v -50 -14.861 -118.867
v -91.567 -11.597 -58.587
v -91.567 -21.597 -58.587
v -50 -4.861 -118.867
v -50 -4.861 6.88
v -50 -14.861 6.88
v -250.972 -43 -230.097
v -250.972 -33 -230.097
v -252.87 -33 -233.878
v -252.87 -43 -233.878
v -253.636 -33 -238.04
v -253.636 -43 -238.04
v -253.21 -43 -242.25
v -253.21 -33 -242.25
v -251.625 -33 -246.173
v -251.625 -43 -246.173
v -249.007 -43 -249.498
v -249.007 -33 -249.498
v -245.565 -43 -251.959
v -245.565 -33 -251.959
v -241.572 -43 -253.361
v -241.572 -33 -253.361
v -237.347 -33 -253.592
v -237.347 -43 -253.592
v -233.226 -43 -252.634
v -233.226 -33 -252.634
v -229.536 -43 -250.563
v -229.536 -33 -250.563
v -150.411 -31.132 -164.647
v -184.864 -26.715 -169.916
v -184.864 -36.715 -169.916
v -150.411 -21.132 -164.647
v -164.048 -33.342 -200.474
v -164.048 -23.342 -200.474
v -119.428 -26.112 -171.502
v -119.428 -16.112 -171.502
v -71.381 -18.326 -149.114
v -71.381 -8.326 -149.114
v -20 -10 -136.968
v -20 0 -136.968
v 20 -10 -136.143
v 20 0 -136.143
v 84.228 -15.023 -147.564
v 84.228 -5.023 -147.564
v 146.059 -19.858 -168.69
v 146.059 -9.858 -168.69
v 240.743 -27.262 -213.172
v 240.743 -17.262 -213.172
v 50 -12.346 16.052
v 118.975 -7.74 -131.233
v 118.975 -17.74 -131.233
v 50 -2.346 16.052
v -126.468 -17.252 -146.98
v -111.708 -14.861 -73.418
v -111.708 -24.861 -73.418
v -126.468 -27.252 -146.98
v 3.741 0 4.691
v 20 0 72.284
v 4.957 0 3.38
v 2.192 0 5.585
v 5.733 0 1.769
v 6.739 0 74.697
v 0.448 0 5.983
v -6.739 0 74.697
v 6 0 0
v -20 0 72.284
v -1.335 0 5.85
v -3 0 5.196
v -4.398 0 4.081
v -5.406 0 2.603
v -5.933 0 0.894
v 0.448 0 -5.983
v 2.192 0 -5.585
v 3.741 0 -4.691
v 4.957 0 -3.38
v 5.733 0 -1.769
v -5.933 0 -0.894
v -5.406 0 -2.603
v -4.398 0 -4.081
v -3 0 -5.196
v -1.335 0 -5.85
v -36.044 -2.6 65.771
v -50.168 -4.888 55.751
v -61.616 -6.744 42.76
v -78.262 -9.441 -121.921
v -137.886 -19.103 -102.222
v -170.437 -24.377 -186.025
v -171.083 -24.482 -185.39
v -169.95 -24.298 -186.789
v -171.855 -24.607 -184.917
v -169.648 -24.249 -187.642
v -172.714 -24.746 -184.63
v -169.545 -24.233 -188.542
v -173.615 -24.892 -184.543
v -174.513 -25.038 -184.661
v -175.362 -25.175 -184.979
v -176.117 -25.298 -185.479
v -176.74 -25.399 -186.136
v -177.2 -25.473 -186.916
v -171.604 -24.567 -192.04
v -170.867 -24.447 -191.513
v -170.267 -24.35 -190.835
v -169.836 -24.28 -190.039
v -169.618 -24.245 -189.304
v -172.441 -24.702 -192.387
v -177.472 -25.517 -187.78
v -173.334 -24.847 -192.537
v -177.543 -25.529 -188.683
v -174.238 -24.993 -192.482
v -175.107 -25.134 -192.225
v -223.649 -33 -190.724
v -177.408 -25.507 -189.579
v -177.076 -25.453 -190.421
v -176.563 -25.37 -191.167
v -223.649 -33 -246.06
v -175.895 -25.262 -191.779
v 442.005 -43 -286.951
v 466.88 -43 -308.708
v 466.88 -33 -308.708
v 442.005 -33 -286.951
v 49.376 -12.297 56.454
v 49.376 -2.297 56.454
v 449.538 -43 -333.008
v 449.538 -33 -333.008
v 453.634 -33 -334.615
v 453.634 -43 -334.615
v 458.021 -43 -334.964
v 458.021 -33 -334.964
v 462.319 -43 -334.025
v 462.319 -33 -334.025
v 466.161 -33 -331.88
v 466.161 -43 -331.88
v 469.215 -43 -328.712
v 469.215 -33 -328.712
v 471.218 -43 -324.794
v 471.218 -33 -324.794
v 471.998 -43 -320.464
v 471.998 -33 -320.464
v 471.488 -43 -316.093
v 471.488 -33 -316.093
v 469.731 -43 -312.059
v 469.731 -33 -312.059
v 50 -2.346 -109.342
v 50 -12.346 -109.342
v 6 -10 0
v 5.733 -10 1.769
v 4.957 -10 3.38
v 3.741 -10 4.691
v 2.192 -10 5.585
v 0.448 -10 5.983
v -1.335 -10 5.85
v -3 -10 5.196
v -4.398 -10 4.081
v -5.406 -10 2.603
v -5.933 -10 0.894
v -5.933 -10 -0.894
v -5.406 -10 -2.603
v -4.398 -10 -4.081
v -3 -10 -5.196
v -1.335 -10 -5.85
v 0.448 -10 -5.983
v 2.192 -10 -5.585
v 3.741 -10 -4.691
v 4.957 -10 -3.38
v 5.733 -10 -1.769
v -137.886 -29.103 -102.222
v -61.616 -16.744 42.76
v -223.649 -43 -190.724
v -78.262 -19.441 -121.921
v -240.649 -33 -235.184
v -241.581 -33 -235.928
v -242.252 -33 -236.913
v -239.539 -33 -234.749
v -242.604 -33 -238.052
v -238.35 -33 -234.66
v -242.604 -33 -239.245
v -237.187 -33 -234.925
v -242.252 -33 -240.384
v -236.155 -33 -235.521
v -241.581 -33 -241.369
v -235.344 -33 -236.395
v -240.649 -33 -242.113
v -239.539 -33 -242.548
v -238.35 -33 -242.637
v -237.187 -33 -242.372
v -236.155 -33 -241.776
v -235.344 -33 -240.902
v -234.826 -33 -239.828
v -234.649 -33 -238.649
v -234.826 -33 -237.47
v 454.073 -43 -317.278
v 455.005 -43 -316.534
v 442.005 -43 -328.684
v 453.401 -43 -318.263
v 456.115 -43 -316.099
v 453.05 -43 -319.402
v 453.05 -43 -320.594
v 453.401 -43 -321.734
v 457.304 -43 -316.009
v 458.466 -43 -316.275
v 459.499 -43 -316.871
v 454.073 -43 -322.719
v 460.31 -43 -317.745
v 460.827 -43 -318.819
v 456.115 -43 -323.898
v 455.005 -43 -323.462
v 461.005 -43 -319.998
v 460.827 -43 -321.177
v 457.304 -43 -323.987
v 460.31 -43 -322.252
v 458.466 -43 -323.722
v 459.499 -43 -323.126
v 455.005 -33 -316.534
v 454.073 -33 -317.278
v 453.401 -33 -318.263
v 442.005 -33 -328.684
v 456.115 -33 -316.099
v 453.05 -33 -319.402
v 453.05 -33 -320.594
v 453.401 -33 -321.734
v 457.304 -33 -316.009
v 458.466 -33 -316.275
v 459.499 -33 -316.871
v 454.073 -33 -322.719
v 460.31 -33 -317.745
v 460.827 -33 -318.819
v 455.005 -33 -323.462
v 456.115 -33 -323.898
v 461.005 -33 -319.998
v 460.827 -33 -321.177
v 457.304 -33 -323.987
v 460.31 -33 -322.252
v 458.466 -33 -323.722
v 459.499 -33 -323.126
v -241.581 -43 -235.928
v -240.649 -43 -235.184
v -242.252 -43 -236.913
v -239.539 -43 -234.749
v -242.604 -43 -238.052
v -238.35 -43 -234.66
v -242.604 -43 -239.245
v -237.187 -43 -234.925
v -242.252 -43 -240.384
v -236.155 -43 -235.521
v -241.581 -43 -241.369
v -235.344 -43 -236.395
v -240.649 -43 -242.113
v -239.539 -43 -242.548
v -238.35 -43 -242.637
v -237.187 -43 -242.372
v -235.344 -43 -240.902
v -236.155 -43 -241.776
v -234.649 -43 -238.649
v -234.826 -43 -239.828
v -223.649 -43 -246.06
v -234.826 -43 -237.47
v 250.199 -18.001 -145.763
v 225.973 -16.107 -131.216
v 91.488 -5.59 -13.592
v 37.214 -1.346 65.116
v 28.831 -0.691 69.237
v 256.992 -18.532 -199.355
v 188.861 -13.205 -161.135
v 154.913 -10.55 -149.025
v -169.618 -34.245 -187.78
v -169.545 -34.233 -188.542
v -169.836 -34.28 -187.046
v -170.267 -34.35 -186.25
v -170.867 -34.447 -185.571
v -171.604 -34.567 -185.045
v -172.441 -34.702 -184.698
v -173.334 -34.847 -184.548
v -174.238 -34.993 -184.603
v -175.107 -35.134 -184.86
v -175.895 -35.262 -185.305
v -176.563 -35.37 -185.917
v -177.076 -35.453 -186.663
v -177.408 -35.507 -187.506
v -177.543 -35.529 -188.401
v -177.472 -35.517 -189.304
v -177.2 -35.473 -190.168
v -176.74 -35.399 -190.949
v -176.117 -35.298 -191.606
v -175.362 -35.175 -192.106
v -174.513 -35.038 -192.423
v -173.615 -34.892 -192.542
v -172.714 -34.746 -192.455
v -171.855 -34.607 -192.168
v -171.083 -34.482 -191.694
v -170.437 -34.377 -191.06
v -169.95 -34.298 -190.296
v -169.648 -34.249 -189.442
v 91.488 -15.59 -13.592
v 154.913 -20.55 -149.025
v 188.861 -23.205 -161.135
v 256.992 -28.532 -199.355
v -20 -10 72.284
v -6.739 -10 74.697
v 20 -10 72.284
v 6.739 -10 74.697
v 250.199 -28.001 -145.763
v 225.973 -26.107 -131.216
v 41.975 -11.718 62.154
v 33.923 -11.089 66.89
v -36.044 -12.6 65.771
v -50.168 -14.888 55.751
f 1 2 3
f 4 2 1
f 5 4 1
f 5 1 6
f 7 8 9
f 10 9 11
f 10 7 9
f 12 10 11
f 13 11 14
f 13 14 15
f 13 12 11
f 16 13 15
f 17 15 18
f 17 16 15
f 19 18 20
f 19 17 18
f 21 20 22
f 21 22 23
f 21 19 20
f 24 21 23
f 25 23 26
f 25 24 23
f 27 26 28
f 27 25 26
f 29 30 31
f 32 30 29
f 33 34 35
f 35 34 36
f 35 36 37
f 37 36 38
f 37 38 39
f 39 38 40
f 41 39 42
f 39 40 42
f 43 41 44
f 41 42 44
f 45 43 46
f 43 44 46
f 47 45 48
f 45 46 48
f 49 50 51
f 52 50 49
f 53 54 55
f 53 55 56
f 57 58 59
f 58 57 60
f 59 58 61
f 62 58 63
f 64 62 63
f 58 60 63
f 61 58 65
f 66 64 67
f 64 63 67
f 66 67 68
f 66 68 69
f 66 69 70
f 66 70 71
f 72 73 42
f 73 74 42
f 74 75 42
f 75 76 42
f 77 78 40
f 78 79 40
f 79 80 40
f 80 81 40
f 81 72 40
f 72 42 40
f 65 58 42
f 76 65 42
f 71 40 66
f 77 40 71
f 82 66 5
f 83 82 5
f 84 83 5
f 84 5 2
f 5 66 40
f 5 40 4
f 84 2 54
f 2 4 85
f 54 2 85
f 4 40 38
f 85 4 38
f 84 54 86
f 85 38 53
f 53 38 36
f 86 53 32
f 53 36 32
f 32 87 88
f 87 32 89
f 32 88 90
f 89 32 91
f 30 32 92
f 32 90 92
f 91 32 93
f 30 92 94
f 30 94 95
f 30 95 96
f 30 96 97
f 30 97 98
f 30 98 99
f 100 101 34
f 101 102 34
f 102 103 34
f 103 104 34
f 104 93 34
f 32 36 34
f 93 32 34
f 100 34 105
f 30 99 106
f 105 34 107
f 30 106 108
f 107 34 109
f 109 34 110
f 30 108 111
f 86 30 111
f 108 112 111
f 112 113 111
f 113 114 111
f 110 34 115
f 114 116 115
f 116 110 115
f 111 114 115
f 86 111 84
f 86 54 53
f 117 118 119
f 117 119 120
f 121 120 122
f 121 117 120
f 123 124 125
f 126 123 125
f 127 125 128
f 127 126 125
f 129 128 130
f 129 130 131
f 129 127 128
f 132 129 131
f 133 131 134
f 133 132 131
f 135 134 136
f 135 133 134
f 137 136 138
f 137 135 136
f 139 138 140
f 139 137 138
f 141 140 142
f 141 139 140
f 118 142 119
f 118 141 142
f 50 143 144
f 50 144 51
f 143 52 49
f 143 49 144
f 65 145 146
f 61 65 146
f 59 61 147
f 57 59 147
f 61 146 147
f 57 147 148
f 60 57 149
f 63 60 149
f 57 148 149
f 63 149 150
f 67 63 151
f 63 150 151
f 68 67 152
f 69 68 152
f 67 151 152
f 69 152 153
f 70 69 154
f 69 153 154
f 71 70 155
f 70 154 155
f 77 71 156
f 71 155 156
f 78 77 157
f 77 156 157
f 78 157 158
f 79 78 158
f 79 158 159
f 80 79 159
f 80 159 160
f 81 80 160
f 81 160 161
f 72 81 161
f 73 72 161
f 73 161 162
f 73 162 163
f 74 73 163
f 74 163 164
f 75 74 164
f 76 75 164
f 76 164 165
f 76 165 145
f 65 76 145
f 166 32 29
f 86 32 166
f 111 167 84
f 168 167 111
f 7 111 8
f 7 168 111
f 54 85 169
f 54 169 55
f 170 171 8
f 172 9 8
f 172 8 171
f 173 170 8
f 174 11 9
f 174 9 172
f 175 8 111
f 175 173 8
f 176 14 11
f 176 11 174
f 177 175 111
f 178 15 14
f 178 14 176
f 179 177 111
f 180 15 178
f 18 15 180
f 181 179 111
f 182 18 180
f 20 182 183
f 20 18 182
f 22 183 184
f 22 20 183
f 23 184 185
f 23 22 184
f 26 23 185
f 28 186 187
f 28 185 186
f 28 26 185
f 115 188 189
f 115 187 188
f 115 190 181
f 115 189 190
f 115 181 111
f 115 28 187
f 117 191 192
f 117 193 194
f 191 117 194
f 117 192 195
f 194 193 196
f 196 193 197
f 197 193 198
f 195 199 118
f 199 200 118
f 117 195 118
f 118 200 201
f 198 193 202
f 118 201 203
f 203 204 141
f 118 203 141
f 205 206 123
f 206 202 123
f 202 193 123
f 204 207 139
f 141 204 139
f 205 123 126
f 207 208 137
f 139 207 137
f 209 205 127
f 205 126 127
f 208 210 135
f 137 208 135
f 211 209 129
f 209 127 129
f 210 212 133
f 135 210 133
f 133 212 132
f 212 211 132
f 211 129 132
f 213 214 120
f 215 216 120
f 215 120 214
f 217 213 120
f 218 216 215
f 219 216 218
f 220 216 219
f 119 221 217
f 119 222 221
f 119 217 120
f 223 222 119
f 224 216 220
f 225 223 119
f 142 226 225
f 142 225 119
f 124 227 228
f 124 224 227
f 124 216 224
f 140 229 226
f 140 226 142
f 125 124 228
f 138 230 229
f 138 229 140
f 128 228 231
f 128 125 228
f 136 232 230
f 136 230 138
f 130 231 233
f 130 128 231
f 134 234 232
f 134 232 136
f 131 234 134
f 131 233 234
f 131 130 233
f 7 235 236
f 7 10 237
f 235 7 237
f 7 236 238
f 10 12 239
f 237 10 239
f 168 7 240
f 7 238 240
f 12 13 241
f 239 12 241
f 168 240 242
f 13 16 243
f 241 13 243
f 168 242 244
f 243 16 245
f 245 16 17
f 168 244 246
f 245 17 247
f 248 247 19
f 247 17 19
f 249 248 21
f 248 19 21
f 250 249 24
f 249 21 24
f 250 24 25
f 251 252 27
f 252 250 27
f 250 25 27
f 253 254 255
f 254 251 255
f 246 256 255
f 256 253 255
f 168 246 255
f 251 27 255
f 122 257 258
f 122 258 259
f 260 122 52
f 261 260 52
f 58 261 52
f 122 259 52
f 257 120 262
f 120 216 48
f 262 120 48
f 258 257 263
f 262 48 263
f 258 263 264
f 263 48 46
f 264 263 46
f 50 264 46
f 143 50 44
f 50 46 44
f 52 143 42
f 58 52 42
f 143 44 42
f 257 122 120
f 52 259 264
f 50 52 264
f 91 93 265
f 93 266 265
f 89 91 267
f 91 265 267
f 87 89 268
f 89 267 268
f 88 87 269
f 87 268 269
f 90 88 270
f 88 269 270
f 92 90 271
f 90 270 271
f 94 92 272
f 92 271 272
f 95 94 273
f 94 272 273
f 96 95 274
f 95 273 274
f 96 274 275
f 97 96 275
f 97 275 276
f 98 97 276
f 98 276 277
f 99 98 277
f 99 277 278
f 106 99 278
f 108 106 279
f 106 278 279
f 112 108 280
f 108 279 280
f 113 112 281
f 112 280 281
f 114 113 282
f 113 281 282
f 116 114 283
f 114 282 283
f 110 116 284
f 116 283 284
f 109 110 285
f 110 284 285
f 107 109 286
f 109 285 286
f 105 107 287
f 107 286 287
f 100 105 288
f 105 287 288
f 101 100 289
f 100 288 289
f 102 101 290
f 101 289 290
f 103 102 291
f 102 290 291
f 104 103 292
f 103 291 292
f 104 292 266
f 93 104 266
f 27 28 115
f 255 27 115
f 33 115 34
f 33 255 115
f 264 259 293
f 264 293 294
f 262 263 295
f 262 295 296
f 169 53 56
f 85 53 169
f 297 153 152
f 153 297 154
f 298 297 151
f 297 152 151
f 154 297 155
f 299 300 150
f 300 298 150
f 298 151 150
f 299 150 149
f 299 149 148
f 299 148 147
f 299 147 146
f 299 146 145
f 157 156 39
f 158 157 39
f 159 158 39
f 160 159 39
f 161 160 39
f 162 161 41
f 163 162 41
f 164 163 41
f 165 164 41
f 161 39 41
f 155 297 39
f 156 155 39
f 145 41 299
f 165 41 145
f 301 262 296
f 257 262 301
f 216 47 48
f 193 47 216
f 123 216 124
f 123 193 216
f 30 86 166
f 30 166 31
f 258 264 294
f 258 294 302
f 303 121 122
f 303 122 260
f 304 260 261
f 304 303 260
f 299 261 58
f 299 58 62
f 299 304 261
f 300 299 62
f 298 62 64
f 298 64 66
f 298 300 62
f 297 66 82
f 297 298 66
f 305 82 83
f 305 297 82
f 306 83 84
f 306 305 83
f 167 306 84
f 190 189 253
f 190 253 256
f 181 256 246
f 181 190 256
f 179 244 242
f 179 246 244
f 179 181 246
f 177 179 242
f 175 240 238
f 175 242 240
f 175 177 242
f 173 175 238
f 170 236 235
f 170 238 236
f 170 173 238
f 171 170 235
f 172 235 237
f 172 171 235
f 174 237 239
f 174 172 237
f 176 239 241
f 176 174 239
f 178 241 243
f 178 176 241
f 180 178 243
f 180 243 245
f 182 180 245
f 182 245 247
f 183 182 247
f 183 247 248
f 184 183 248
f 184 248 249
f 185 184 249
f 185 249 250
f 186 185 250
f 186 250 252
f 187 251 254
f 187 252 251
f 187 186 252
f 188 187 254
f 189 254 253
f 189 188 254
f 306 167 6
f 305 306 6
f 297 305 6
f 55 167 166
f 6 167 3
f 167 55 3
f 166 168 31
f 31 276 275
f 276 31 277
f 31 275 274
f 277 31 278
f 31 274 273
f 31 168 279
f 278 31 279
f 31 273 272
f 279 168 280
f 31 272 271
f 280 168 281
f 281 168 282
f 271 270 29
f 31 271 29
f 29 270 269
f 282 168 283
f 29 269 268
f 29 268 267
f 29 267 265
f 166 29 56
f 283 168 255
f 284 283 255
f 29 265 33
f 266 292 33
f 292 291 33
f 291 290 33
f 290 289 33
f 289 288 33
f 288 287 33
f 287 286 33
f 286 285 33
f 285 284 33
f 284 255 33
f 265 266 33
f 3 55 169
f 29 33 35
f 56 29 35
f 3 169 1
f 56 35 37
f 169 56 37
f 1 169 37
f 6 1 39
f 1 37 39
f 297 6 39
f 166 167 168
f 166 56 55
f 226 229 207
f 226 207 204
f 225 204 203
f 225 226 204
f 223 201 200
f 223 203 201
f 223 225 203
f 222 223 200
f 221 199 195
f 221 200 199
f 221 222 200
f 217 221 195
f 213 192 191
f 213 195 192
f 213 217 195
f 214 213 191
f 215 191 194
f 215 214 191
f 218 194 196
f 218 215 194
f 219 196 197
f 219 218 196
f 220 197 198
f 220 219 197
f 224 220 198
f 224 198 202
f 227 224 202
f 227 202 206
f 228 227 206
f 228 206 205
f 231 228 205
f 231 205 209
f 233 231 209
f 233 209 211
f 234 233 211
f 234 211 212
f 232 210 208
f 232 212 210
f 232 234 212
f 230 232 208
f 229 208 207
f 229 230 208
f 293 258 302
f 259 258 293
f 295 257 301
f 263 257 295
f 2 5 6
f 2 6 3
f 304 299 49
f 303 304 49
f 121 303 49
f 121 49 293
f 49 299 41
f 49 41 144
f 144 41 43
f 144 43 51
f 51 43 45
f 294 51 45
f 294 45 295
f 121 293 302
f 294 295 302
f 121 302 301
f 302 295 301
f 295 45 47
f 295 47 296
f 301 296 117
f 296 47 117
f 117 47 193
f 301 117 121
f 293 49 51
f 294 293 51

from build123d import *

# Parameters (mm, degrees)
F1_W     = 30
F1_H     = 10
F2_DEPTH = 340
F3_DEPTH = 100
F5_DEPTH = 76
F6_R     = 4
F6_R_2   = 6
F7_DEPTH = 66


with BuildPart() as f2:
    # F1 (on Top) → F2 (new body)
    with BuildSketch(Plane.XY):
        Polygon((0, 0), (-20, 0), (-20, -10), (0, -10), (20, -10), (20, 0), align=None)
        Polygon((-20, -10), (-20, 0), (-223.64854, -33), (-223.64854, -43), align=None)
        with Locations((-238.64854, -38)):
            Rectangle(F1_W, F1_H)
        Polygon((442.00493, -33), (20, 0), (20, -10), (442.00493, -43), align=None)
        with Locations((457.00493, -38)):
            Rectangle(F1_W, F1_H)
    extrude(amount=-F2_DEPTH)

    # F1 (on Top) → F3 (join)
    with BuildSketch(Plane.XY):
        Polygon((0, 0), (-20, 0), (-20, -10), (0, -10), (20, -10), (20, 0), align=None)
        Polygon((-20, -10), (-20, 0), (-223.64854, -33), (-223.64854, -43), align=None)
        with Locations((-238.64854, -38)):
            Rectangle(F1_W, F1_H)
        Polygon((442.00493, -33), (20, 0), (20, -10), (442.00493, -43), align=None)
        with Locations((457.00493, -38)):
            Rectangle(F1_W, F1_H)
    extrude(amount=F3_DEPTH)

    # F4 (on Front) → F5 (intersect, symmetric)
    with BuildSketch(Plane.XZ):
        with BuildLine():
            ThreePointArc((-250.9718022583, -230.0965111685), (-249.006915225, -249.4976876834), (-229.5356153331, -250.563010045))
            ThreePointArc((-229.5356153331, -250.563010045), (-225.2006047987, -245.2933166844), (-223.6485386505, -238.6485386505))
            ThreePointArc((-223.6485386505, -238.6485386505), (-234.1679669301, -224.3333552056), (-250.9718022583, -230.0965111685))
        make_face()
        with BuildLine():
            add(Edge.make_bspline(
                [(-229.5356153331, -250.563010045), (-208.7207010553, -234.6424785008), (-187.0701685552, -217.0301430269), (-164.0481391717, -200.4741451059)],
                knots=[0, 0, 0, 0, 0.1373195068, 0.1373195068, 0.1373195068, 0.1373195068], degree=3))
            Line((-229.5356153331, -250.563010045), (-164.0481391717, -200.4741451059))
        make_face()
        with BuildLine():
            ThreePointArc((-223.6485386505, -238.6485386505), (-225.2006047987, -245.2933166844), (-229.5356153331, -250.563010045))
            add(Edge.make_bspline(
                [(-229.5356153331, -250.563010045), (-208.7207010553, -234.6424785008), (-187.0701685552, -217.0301430269), (-164.0481391717, -200.4741451059)],
                knots=[0, 0, 0, 0, 0.1373195068, 0.1373195068, 0.1373195068, 0.1373195068], degree=3))
            Line((-164.0481391717, -200.4741451059), (0, -75))
            ThreePointArc((0, -75), (-66.4530293795, -34.7706037666), (-61.6163187638, 42.7601363655))
            Line((-61.6163187638, 42.7601363655), (-250.9718022583, -230.0965111685))
            ThreePointArc((-250.9718022583, -230.0965111685), (-234.1679669301, -224.3333552056), (-223.6485386505, -238.6485386505))
        make_face()
        with BuildLine():
            Line((0, -75), (-164.0481391717, -200.4741451059))
            add(Edge.make_bspline(
                [(-164.0481391717, -200.4741451059), (-116.7152354778, -166.4352929221), (-4.1014041633, -103.751655246), (155.4809175381, -168.4276528716), (240.7432263876, -213.1721002441)],
                knots=[0.1373195068, 0.1373195068, 0.1373195068, 0.1373195068, 0.4196460942, 0.7357326781, 0.7357326781, 0.7357326781, 0.7357326781], degree=3))
            Line((240.7432263876, -213.1721002441), (0, -75))
        make_face()
        with BuildLine():
            ThreePointArc((49.3759786376, 56.4536334843), (-9.1833788682, 74.4356470555), (-61.6163187638, 42.7601363655))
            ThreePointArc((-61.6163187638, 42.7601363655), (-66.4530293795, -34.7706037666), (0, -75))
            ThreePointArc((0, -75), (53.033008589, -53.033008589), (75, 0))
            ThreePointArc((75, 0), (68.2942105812, 30.9983999763), (49.3759786376, 56.4536334843))
        make_face()
        with BuildLine():
            ThreePointArc((75, 0), (53.033008589, -53.033008589), (0, -75))
            Line((0, -75), (240.7432263876, -213.1721002441))
            add(Edge.make_bspline(
                [(240.7432263876, -213.1721002441), (312.0276249141, -250.5811390256), (383.9898125383, -295.3870059685), (449.5382273905, -333.0078449167)],
                knots=[0.7357326781, 0.7357326781, 0.7357326781, 0.7357326781, 1, 1, 1, 1], degree=3))
            ThreePointArc((449.5382273905, -333.0078449167), (444.7952538382, -311.2848606652), (466.8801220688, -308.7075678715))
            Line((466.8801220688, -308.7075678715), (49.3759786376, 56.4536334843))
            ThreePointArc((49.3759786376, 56.4536334843), (68.2942105812, 30.9983999763), (75, 0))
        make_face()
        with BuildLine():
            add(Edge.make_bspline(
                [(240.7432263876, -213.1721002441), (312.0276249141, -250.5811390256), (383.9898125383, -295.3870059685), (449.5382273905, -333.0078449167)],
                knots=[0.7357326781, 0.7357326781, 0.7357326781, 0.7357326781, 1, 1, 1, 1], degree=3))
            Line((240.7432263876, -213.1721002441), (449.5382273905, -333.0078449167))
        make_face()
        with BuildLine():
            ThreePointArc((466.8801220688, -308.7075678715), (444.7952538382, -311.2848606652), (449.5382273905, -333.0078449167))
            ThreePointArc((449.5382273905, -333.0078449167), (464.521558007, -332.979057912), (472.0049255088, -319.9982938402))
            ThreePointArc((472.0049255088, -319.9982938402), (470.6637678536, -313.7986143485), (466.8801220688, -308.7075678715))
        make_face()
    extrude(amount=F5_DEPTH, both=True, mode=Mode.INTERSECT)

    # F6 (on face) → F7 (cut, symmetric)
    with BuildSketch(Plane.XZ.offset(10)):
        Polygon((-50, -118.8666767037), (-50, 6.8798678522), (-91.5673471808, -58.5868135927), align=None)
        Polygon((-126.4676634488, -146.9804479722), (-78.2616292159, -121.9207695), (-111.7079214913, -73.417844568), align=None)
        Polygon((-150.4108945671, -164.6469025725), (-137.8857839916, -102.2217094685), (-184.8640607304, -169.9162639715), align=None)
        Polygon((50, 16.0521292518), (50, -109.3419641256), (118.974648416, -131.2328726053), align=None)
        Polygon((225.9725652657, -131.215947327), (91.4881845235, -13.5920175816), (154.9125586599, -149.0252423531), align=None)
        Polygon((250.1992884028, -145.7627206944), (188.8613105429, -161.1354485647), (256.9922346805, -199.3553946004), align=None)
        with Locations((-238.6485386505, -238.6485386505)):
            Circle(F6_R)
        with Locations((457.0049255088, -319.9982938402)):
            Circle(F6_R)
        Circle(F6_R_2)
        with Locations((-173.5450253277, -188.5422087565)):
            Circle(F6_R)
    extrude(amount=F7_DEPTH, both=True, mode=Mode.SUBTRACT)


solid = f2.part
